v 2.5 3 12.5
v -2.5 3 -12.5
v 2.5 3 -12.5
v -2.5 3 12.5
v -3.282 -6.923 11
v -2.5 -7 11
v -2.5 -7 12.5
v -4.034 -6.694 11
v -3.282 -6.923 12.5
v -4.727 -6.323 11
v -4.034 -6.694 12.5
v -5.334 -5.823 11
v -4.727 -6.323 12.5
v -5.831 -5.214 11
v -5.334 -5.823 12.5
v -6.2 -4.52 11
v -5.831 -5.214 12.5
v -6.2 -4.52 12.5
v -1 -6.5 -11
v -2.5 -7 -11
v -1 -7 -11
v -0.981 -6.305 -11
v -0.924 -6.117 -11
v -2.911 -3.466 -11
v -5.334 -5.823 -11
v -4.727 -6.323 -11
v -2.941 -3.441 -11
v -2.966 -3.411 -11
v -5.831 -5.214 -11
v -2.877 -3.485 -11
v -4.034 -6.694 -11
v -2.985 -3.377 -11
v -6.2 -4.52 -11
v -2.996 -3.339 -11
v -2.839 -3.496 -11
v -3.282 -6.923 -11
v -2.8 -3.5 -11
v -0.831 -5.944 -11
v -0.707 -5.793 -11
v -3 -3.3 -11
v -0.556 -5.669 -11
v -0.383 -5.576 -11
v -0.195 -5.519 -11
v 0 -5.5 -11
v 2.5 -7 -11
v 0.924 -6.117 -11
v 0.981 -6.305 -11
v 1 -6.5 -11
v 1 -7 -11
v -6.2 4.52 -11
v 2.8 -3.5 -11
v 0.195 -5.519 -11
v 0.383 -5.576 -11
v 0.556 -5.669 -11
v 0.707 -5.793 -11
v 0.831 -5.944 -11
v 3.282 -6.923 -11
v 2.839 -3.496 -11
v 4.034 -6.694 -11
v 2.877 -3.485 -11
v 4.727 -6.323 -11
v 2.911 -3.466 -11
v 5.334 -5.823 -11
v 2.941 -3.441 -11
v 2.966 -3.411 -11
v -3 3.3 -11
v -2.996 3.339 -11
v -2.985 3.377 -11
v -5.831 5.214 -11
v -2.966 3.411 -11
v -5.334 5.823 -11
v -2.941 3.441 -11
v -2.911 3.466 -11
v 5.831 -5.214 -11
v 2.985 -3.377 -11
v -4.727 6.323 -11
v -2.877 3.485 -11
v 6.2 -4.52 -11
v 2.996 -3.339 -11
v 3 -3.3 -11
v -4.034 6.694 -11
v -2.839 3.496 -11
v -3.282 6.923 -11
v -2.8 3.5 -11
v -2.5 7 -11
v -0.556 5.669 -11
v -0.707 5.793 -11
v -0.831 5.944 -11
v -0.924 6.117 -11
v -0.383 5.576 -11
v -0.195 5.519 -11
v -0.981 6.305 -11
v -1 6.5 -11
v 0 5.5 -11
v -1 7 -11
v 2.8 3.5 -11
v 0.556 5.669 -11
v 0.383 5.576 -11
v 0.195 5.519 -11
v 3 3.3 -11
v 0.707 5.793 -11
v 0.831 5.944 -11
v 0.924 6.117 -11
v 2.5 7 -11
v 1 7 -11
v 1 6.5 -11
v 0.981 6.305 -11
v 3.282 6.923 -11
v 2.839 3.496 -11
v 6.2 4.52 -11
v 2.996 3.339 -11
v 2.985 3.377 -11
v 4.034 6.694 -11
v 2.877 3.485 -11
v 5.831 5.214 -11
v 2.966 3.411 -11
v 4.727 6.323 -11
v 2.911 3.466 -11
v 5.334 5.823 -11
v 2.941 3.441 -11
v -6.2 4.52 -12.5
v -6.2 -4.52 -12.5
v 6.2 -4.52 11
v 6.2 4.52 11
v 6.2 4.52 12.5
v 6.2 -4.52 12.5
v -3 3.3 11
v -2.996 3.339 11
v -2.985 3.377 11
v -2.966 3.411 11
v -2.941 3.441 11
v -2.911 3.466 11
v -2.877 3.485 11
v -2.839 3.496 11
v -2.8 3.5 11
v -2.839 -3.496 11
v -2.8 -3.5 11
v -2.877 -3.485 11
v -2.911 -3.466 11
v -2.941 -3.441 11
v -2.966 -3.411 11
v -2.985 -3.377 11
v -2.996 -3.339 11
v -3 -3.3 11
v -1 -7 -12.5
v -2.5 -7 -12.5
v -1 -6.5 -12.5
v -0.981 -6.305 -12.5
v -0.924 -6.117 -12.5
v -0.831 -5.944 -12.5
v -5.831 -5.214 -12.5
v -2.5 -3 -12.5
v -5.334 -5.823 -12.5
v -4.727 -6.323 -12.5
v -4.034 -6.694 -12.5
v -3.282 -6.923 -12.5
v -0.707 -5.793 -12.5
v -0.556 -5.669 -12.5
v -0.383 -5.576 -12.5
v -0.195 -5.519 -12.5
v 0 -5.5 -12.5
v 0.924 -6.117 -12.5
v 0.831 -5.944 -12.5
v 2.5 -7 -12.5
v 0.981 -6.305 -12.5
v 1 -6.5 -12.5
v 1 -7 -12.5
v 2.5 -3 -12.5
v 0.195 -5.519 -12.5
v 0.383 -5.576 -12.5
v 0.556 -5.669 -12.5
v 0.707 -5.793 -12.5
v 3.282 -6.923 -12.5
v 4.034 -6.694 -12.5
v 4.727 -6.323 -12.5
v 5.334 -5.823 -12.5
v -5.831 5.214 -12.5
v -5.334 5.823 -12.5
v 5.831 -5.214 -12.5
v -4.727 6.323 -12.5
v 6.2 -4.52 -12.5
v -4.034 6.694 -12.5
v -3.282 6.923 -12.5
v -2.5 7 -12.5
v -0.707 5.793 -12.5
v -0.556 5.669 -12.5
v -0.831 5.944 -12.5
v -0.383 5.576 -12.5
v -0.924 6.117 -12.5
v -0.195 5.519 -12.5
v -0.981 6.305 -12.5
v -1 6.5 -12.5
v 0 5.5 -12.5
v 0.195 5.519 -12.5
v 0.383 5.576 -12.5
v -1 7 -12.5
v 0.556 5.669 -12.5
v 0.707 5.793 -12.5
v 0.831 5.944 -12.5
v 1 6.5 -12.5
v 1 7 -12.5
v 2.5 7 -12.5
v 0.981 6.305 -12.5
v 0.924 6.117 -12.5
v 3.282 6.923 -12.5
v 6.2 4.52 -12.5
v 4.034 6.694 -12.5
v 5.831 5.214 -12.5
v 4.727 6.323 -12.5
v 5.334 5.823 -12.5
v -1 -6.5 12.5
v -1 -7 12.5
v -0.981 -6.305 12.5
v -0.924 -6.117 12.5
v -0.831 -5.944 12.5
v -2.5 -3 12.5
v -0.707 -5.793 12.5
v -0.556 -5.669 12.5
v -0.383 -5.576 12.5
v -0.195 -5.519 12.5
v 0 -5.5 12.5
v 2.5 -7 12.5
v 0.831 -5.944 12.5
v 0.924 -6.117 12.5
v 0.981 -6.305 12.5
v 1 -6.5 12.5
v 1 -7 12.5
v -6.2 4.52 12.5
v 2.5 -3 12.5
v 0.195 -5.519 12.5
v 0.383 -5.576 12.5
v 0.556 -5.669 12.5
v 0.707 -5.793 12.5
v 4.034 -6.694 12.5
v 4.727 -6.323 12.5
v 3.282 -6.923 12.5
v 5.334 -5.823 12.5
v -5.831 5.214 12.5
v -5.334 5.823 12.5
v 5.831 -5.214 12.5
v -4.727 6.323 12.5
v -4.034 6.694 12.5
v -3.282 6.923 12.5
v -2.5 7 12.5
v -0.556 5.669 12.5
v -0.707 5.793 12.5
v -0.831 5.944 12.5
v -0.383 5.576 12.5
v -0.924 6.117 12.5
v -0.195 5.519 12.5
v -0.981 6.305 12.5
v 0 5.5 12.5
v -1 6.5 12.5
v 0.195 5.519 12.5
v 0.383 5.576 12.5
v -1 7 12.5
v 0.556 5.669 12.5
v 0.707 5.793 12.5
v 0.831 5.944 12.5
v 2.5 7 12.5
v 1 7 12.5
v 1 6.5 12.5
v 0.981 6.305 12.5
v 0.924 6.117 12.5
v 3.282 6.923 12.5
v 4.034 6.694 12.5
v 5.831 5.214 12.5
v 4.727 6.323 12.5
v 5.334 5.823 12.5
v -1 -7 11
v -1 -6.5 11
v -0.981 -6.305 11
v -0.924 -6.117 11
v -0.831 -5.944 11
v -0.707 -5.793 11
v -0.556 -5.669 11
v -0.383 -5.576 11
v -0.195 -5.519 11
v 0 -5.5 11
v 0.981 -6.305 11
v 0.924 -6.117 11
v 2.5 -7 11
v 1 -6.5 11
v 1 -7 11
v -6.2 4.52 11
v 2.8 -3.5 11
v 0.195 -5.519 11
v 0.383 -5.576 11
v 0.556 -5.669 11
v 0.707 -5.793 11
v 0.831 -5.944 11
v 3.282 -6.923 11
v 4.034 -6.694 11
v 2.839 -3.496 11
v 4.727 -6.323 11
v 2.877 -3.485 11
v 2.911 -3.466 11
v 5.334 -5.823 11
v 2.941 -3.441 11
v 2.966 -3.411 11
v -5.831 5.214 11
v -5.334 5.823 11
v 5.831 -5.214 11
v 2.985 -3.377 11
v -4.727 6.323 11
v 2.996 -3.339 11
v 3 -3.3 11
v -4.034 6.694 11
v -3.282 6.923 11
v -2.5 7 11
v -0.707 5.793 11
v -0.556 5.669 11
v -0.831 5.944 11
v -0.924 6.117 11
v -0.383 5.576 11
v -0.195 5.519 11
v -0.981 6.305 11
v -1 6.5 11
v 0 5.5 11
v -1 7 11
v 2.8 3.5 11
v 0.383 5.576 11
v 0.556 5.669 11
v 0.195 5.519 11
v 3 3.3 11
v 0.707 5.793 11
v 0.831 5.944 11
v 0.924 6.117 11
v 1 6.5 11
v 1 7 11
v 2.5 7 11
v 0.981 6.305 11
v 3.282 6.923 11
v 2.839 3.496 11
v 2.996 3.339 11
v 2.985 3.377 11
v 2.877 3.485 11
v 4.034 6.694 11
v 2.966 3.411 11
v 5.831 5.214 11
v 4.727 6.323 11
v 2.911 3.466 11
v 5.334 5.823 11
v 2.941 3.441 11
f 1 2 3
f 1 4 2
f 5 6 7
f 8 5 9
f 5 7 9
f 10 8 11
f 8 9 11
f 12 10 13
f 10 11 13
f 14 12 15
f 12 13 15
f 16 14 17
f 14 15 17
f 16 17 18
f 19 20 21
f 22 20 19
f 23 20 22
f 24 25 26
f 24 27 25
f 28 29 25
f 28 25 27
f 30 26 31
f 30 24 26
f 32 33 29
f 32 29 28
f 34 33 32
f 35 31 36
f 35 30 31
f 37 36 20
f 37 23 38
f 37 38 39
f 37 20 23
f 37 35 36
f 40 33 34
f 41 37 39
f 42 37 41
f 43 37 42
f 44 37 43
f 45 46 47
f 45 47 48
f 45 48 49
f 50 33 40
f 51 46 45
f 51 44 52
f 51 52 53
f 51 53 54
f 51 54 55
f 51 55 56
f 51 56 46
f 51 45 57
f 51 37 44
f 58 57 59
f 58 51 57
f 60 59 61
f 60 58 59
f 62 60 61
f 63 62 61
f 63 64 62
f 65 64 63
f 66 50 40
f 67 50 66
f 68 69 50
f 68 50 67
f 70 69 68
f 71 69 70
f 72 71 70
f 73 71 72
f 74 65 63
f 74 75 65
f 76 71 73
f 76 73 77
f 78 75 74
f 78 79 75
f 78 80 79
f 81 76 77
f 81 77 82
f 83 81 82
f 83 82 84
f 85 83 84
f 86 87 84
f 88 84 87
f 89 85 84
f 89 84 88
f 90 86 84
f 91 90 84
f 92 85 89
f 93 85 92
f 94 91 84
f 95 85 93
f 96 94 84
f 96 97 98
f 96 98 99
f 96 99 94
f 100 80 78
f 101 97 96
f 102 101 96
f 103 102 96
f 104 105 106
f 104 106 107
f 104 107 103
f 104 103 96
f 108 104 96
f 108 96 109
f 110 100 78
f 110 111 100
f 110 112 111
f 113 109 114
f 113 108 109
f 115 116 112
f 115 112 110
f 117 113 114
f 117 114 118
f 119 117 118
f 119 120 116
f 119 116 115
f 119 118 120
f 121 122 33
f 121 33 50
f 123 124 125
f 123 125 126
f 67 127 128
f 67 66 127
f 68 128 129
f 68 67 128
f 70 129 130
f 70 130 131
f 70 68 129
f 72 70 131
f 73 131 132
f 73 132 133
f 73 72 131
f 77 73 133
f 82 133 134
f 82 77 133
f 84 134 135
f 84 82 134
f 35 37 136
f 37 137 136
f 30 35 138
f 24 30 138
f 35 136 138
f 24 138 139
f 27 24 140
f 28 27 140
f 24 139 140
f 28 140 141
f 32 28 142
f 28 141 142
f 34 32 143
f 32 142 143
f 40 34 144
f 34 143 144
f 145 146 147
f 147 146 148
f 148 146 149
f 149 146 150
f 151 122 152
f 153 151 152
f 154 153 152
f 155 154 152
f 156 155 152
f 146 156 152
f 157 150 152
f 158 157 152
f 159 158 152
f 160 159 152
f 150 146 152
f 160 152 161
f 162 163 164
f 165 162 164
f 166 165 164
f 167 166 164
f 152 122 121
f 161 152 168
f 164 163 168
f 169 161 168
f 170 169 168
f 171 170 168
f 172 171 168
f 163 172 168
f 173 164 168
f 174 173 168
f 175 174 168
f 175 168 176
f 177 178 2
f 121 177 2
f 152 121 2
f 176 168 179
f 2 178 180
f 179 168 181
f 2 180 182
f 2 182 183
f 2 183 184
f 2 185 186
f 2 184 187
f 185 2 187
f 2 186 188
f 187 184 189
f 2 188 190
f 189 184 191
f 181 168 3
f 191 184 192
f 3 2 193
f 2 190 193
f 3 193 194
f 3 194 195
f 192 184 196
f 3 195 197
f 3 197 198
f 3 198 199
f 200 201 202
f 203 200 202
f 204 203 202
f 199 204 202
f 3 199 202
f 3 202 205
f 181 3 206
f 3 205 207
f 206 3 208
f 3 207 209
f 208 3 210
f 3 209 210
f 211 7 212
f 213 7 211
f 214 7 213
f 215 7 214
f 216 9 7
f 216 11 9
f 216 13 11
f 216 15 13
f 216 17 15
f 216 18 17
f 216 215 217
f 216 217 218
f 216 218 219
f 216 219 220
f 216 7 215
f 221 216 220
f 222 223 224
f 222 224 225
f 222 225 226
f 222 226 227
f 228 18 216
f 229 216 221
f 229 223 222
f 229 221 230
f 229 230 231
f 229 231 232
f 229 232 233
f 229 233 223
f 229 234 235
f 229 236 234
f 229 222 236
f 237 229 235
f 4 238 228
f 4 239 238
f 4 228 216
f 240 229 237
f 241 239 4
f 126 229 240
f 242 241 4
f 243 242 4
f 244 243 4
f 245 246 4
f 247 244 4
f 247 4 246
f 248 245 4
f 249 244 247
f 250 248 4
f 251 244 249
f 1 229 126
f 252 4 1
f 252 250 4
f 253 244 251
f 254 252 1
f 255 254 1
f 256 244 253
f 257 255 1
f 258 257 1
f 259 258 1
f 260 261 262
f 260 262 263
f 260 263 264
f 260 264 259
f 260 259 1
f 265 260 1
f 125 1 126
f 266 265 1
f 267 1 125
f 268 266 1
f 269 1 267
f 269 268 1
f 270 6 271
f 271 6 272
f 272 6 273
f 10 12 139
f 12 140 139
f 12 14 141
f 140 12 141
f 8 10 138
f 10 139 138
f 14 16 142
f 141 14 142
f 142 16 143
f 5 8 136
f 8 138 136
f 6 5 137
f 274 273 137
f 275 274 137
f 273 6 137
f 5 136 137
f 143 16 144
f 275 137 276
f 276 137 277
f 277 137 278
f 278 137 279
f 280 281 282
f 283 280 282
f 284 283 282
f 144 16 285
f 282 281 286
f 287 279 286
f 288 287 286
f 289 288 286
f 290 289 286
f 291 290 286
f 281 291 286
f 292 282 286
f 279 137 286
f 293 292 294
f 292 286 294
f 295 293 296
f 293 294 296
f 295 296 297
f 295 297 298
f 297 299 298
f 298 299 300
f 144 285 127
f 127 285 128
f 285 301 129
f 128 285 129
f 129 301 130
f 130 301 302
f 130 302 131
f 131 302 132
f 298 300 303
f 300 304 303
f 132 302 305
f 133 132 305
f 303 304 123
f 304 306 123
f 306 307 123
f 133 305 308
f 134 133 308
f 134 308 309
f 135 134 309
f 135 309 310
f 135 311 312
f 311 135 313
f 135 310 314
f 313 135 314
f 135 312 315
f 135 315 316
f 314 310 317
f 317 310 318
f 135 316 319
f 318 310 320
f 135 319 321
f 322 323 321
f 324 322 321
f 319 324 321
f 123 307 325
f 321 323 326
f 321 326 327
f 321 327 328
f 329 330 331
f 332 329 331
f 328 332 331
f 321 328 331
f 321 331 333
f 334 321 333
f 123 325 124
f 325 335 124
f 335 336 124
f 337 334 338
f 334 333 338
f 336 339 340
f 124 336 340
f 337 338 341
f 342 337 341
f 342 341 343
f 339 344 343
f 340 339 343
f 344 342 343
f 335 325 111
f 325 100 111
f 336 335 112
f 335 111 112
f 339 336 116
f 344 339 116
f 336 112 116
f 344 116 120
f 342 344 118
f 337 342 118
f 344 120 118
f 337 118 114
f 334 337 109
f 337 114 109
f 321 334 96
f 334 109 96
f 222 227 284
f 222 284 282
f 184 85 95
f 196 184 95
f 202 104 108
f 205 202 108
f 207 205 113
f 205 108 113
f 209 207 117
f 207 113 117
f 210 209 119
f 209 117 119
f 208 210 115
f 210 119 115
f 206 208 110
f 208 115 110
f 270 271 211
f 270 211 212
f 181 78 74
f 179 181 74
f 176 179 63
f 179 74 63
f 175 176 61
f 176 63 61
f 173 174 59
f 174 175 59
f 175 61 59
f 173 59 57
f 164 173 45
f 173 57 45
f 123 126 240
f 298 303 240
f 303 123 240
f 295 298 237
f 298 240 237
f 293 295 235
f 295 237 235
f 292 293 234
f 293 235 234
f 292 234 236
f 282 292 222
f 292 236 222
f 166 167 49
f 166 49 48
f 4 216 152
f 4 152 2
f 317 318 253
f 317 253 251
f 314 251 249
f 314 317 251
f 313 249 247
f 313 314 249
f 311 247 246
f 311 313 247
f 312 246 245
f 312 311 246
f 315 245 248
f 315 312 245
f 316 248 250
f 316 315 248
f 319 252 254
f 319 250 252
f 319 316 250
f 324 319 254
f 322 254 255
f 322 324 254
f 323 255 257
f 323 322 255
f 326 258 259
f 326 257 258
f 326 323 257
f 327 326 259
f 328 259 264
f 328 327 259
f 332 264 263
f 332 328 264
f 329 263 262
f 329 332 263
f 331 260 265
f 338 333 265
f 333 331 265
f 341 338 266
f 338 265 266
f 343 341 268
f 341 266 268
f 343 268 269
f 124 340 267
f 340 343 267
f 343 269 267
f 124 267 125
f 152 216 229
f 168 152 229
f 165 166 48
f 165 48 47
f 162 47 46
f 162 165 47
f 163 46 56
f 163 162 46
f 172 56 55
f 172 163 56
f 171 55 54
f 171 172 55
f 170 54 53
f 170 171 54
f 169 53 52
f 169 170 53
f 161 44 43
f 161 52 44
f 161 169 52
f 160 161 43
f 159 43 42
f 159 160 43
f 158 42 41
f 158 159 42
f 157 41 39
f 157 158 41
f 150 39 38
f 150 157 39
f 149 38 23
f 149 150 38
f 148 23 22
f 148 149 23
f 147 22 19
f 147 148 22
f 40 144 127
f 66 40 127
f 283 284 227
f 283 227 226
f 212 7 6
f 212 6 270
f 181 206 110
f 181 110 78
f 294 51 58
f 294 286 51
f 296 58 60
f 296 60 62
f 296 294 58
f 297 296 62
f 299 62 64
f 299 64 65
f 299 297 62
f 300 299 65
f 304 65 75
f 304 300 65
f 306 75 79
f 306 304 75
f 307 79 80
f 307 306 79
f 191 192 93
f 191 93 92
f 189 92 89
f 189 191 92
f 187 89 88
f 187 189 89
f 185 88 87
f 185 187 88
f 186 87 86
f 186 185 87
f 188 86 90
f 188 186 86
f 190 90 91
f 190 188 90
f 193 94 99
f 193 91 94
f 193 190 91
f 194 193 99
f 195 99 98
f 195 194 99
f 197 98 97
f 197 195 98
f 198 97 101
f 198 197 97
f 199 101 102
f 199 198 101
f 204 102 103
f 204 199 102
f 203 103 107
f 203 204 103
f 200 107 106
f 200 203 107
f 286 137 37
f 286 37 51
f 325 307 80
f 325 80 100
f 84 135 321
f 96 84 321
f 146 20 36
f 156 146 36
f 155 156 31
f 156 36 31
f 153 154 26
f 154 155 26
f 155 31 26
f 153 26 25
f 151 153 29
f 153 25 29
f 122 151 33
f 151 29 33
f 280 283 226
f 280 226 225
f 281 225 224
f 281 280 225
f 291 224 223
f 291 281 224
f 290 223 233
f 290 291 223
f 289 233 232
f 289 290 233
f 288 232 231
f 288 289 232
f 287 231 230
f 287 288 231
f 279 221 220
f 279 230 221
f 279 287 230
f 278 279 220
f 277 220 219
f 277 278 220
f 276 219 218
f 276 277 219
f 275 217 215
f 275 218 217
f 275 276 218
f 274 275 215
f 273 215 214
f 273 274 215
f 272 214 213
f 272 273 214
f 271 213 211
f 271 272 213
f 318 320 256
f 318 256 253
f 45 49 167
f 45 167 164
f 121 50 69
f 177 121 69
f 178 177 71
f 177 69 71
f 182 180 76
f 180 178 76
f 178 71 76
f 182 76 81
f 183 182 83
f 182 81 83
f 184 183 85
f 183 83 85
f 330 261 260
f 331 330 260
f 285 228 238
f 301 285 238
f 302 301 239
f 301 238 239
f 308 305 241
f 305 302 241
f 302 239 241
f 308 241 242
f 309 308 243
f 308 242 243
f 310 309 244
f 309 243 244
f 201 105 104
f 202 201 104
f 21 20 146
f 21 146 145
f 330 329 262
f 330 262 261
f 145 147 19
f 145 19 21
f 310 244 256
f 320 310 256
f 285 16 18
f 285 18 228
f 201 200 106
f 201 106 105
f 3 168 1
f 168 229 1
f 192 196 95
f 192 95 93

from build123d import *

# Parameters (mm, degrees)
SKETCH_1_W               = 6
SKETCH_1_H               = 7
SKETCH_1_W_2             = 5
SKETCH_1_H_2             = 6
EXTRUDE_1_DEPTH          = 12.5
SKETCH_2_W               = 6
SKETCH_2_H               = 7
EXTRUDE_2_DEPTH          = 1.5
SKETCH_3_R               = 19.100398606
SKETCH_3_W               = 18.715870292
SKETCH_3_H               = 14
CUT_EXTRUDE_1_DEPTH      = 28.522717889
CUT_EXTRUDE_2_DEPTH      = 27.762847382
CUT_EXTRUDE_3_DEPTH      = 27.762847382
CUT_EXTRUDE_3_DEPTH_BACK = 27.762847382
FILLET_1_R               = 0.2


with BuildPart() as part:
    # 草图1 → 凸台-拉伸1 (new, symmetric)
    with BuildSketch(Plane.XY):
        Rectangle(SKETCH_1_W, SKETCH_1_H)
        Rectangle(SKETCH_1_W_2, SKETCH_1_H_2, mode=Mode.SUBTRACT)
    extrude(amount=EXTRUDE_1_DEPTH, both=True)

    # 草图2 → 凸台-拉伸2 (add)
    with BuildSketch(Plane.XY.offset(12.5)):
        with BuildLine():
            Line((-6.5, 6.92820323), (-6.5, -6.92820323))
            ThreePointArc((-6.5, -6.92820323), (0, -9.5), (6.5, -6.92820323))
            Line((6.5, -6.92820323), (6.5, 6.92820323))
            ThreePointArc((6.5, 6.92820323), (0, 9.5), (-6.5, 6.92820323))
        make_face()
        Rectangle(SKETCH_2_W, SKETCH_2_H, mode=Mode.SUBTRACT)
    extrude_2 = extrude(amount=-EXTRUDE_2_DEPTH)

    # 镜向1: 凸台-拉伸2 across plane
    add(extrude_2.mirror(Plane.XY))

    # 草图3 → 切除-拉伸1 (cut, through all)
    with BuildSketch(Plane.XY.offset(12.5)):
        Circle(SKETCH_3_R)
        Rectangle(SKETCH_3_W, SKETCH_3_H, mode=Mode.SUBTRACT)
    extrude(amount=-CUT_EXTRUDE_1_DEPTH, mode=Mode.SUBTRACT)

    # 草图4 → 切除-拉伸2 (cut, through all)
    with BuildSketch(Plane.XY.offset(12.5)):
        with BuildLine():
            Line((-6.5, 6.92820323), (-6.5, 3))
            ThreePointArc((-6.5, 3), (-5.328427125, 5.828427125), (-2.5, 7))
            Line((-2.5, 7), (-6.422616289, 7))
            ThreePointArc((-6.422616289, 7), (-6.461407868, 6.964209098), (-6.5, 6.92820323))
        make_face()
        with BuildLine():
            ThreePointArc((2.5, 7), (5.328427125, 5.828427125), (6.5, 3))
            Line((6.5, 3), (6.5, 6.92820323))
            ThreePointArc((6.5, 6.92820323), (6.461407868, 6.964209098), (6.422616289, 7))
            Line((6.422616289, 7), (2.5, 7))
        make_face()
        with BuildLine():
            ThreePointArc((6.5, -3), (5.328427127, -5.828427123), (2.500000005, -7))
            Line((2.500000005, -7), (6.422616289, -7))
            ThreePointArc((6.422616289, -7), (6.461407868, -6.964209098), (6.5, -6.92820323))
            Line((6.5, -6.92820323), (6.5, -3))
        make_face()
        with BuildLine():
            ThreePointArc((-6.5, -6.92820323), (-6.461407868, -6.964209098), (-6.422616289, -7))
            Line((-6.422616289, -7), (-2.499999995, -7))
            ThreePointArc((-2.499999995, -7), (-5.328427123, -5.828427127), (-6.5, -3))
            Line((-6.5, -3), (-6.5, -6.92820323))
        make_face()
    extrude(amount=-CUT_EXTRUDE_2_DEPTH, mode=Mode.SUBTRACT)

    # 草图5 → 切除-拉伸3 (cut, two sides: drawn at the far end of the back side and taken through both)
    with BuildSketch(Plane.XY.offset(12.5).offset(-CUT_EXTRUDE_3_DEPTH_BACK)):
        with BuildLine():
            Line((1, 7), (-1, 7))
            Line((-1, 7), (-1, 6.5))
            ThreePointArc((-1, 6.5), (0, 5.5), (1, 6.5))
            Line((1, 6.5), (1, 7))
        make_face()
        with BuildLine():
            Line((-1, -6.5), (-1, -7))
            Line((-1, -7), (1, -7))
            Line((1, -7), (1, -6.5))
            ThreePointArc((1, -6.5), (0, -5.5), (-1, -6.5))
        make_face()
        with BuildLine():
            Line((-6.2, -4.519868415), (-6.2, 4.519868415))
            ThreePointArc((-6.2, 4.519868415), (-6.424283374, 3.774596669), (-6.5, 3))
            Line((-6.5, 3), (-6.5, -3))
            ThreePointArc((-6.5, -3), (-6.424283374, -3.774596669), (-6.2, -4.519868415))
        make_face()
        with BuildLine():
            ThreePointArc((6.5, 3), (6.424283374, 3.774596669), (6.2, 4.519868415))
            Line((6.2, 4.519868415), (6.2, -4.519868415))
            ThreePointArc((6.2, -4.519868415), (6.424283374, -3.774596669), (6.5, -3))
            Line((6.5, -3), (6.5, 3))
        make_face()
    extrude(amount=CUT_EXTRUDE_3_DEPTH + CUT_EXTRUDE_3_DEPTH_BACK, mode=Mode.SUBTRACT)

    # 圆角1
    fillet_1_edges = [part.edges().sort_by_distance(p)[0] for p in [
        (-3, 3.5, 0),
        (3, 3.5, 0),
        (3, -3.5, 0),
        (-3, -3.5, 0),
    ]]
    fillet(fillet_1_edges, radius=FILLET_1_R)


solid = part.part
